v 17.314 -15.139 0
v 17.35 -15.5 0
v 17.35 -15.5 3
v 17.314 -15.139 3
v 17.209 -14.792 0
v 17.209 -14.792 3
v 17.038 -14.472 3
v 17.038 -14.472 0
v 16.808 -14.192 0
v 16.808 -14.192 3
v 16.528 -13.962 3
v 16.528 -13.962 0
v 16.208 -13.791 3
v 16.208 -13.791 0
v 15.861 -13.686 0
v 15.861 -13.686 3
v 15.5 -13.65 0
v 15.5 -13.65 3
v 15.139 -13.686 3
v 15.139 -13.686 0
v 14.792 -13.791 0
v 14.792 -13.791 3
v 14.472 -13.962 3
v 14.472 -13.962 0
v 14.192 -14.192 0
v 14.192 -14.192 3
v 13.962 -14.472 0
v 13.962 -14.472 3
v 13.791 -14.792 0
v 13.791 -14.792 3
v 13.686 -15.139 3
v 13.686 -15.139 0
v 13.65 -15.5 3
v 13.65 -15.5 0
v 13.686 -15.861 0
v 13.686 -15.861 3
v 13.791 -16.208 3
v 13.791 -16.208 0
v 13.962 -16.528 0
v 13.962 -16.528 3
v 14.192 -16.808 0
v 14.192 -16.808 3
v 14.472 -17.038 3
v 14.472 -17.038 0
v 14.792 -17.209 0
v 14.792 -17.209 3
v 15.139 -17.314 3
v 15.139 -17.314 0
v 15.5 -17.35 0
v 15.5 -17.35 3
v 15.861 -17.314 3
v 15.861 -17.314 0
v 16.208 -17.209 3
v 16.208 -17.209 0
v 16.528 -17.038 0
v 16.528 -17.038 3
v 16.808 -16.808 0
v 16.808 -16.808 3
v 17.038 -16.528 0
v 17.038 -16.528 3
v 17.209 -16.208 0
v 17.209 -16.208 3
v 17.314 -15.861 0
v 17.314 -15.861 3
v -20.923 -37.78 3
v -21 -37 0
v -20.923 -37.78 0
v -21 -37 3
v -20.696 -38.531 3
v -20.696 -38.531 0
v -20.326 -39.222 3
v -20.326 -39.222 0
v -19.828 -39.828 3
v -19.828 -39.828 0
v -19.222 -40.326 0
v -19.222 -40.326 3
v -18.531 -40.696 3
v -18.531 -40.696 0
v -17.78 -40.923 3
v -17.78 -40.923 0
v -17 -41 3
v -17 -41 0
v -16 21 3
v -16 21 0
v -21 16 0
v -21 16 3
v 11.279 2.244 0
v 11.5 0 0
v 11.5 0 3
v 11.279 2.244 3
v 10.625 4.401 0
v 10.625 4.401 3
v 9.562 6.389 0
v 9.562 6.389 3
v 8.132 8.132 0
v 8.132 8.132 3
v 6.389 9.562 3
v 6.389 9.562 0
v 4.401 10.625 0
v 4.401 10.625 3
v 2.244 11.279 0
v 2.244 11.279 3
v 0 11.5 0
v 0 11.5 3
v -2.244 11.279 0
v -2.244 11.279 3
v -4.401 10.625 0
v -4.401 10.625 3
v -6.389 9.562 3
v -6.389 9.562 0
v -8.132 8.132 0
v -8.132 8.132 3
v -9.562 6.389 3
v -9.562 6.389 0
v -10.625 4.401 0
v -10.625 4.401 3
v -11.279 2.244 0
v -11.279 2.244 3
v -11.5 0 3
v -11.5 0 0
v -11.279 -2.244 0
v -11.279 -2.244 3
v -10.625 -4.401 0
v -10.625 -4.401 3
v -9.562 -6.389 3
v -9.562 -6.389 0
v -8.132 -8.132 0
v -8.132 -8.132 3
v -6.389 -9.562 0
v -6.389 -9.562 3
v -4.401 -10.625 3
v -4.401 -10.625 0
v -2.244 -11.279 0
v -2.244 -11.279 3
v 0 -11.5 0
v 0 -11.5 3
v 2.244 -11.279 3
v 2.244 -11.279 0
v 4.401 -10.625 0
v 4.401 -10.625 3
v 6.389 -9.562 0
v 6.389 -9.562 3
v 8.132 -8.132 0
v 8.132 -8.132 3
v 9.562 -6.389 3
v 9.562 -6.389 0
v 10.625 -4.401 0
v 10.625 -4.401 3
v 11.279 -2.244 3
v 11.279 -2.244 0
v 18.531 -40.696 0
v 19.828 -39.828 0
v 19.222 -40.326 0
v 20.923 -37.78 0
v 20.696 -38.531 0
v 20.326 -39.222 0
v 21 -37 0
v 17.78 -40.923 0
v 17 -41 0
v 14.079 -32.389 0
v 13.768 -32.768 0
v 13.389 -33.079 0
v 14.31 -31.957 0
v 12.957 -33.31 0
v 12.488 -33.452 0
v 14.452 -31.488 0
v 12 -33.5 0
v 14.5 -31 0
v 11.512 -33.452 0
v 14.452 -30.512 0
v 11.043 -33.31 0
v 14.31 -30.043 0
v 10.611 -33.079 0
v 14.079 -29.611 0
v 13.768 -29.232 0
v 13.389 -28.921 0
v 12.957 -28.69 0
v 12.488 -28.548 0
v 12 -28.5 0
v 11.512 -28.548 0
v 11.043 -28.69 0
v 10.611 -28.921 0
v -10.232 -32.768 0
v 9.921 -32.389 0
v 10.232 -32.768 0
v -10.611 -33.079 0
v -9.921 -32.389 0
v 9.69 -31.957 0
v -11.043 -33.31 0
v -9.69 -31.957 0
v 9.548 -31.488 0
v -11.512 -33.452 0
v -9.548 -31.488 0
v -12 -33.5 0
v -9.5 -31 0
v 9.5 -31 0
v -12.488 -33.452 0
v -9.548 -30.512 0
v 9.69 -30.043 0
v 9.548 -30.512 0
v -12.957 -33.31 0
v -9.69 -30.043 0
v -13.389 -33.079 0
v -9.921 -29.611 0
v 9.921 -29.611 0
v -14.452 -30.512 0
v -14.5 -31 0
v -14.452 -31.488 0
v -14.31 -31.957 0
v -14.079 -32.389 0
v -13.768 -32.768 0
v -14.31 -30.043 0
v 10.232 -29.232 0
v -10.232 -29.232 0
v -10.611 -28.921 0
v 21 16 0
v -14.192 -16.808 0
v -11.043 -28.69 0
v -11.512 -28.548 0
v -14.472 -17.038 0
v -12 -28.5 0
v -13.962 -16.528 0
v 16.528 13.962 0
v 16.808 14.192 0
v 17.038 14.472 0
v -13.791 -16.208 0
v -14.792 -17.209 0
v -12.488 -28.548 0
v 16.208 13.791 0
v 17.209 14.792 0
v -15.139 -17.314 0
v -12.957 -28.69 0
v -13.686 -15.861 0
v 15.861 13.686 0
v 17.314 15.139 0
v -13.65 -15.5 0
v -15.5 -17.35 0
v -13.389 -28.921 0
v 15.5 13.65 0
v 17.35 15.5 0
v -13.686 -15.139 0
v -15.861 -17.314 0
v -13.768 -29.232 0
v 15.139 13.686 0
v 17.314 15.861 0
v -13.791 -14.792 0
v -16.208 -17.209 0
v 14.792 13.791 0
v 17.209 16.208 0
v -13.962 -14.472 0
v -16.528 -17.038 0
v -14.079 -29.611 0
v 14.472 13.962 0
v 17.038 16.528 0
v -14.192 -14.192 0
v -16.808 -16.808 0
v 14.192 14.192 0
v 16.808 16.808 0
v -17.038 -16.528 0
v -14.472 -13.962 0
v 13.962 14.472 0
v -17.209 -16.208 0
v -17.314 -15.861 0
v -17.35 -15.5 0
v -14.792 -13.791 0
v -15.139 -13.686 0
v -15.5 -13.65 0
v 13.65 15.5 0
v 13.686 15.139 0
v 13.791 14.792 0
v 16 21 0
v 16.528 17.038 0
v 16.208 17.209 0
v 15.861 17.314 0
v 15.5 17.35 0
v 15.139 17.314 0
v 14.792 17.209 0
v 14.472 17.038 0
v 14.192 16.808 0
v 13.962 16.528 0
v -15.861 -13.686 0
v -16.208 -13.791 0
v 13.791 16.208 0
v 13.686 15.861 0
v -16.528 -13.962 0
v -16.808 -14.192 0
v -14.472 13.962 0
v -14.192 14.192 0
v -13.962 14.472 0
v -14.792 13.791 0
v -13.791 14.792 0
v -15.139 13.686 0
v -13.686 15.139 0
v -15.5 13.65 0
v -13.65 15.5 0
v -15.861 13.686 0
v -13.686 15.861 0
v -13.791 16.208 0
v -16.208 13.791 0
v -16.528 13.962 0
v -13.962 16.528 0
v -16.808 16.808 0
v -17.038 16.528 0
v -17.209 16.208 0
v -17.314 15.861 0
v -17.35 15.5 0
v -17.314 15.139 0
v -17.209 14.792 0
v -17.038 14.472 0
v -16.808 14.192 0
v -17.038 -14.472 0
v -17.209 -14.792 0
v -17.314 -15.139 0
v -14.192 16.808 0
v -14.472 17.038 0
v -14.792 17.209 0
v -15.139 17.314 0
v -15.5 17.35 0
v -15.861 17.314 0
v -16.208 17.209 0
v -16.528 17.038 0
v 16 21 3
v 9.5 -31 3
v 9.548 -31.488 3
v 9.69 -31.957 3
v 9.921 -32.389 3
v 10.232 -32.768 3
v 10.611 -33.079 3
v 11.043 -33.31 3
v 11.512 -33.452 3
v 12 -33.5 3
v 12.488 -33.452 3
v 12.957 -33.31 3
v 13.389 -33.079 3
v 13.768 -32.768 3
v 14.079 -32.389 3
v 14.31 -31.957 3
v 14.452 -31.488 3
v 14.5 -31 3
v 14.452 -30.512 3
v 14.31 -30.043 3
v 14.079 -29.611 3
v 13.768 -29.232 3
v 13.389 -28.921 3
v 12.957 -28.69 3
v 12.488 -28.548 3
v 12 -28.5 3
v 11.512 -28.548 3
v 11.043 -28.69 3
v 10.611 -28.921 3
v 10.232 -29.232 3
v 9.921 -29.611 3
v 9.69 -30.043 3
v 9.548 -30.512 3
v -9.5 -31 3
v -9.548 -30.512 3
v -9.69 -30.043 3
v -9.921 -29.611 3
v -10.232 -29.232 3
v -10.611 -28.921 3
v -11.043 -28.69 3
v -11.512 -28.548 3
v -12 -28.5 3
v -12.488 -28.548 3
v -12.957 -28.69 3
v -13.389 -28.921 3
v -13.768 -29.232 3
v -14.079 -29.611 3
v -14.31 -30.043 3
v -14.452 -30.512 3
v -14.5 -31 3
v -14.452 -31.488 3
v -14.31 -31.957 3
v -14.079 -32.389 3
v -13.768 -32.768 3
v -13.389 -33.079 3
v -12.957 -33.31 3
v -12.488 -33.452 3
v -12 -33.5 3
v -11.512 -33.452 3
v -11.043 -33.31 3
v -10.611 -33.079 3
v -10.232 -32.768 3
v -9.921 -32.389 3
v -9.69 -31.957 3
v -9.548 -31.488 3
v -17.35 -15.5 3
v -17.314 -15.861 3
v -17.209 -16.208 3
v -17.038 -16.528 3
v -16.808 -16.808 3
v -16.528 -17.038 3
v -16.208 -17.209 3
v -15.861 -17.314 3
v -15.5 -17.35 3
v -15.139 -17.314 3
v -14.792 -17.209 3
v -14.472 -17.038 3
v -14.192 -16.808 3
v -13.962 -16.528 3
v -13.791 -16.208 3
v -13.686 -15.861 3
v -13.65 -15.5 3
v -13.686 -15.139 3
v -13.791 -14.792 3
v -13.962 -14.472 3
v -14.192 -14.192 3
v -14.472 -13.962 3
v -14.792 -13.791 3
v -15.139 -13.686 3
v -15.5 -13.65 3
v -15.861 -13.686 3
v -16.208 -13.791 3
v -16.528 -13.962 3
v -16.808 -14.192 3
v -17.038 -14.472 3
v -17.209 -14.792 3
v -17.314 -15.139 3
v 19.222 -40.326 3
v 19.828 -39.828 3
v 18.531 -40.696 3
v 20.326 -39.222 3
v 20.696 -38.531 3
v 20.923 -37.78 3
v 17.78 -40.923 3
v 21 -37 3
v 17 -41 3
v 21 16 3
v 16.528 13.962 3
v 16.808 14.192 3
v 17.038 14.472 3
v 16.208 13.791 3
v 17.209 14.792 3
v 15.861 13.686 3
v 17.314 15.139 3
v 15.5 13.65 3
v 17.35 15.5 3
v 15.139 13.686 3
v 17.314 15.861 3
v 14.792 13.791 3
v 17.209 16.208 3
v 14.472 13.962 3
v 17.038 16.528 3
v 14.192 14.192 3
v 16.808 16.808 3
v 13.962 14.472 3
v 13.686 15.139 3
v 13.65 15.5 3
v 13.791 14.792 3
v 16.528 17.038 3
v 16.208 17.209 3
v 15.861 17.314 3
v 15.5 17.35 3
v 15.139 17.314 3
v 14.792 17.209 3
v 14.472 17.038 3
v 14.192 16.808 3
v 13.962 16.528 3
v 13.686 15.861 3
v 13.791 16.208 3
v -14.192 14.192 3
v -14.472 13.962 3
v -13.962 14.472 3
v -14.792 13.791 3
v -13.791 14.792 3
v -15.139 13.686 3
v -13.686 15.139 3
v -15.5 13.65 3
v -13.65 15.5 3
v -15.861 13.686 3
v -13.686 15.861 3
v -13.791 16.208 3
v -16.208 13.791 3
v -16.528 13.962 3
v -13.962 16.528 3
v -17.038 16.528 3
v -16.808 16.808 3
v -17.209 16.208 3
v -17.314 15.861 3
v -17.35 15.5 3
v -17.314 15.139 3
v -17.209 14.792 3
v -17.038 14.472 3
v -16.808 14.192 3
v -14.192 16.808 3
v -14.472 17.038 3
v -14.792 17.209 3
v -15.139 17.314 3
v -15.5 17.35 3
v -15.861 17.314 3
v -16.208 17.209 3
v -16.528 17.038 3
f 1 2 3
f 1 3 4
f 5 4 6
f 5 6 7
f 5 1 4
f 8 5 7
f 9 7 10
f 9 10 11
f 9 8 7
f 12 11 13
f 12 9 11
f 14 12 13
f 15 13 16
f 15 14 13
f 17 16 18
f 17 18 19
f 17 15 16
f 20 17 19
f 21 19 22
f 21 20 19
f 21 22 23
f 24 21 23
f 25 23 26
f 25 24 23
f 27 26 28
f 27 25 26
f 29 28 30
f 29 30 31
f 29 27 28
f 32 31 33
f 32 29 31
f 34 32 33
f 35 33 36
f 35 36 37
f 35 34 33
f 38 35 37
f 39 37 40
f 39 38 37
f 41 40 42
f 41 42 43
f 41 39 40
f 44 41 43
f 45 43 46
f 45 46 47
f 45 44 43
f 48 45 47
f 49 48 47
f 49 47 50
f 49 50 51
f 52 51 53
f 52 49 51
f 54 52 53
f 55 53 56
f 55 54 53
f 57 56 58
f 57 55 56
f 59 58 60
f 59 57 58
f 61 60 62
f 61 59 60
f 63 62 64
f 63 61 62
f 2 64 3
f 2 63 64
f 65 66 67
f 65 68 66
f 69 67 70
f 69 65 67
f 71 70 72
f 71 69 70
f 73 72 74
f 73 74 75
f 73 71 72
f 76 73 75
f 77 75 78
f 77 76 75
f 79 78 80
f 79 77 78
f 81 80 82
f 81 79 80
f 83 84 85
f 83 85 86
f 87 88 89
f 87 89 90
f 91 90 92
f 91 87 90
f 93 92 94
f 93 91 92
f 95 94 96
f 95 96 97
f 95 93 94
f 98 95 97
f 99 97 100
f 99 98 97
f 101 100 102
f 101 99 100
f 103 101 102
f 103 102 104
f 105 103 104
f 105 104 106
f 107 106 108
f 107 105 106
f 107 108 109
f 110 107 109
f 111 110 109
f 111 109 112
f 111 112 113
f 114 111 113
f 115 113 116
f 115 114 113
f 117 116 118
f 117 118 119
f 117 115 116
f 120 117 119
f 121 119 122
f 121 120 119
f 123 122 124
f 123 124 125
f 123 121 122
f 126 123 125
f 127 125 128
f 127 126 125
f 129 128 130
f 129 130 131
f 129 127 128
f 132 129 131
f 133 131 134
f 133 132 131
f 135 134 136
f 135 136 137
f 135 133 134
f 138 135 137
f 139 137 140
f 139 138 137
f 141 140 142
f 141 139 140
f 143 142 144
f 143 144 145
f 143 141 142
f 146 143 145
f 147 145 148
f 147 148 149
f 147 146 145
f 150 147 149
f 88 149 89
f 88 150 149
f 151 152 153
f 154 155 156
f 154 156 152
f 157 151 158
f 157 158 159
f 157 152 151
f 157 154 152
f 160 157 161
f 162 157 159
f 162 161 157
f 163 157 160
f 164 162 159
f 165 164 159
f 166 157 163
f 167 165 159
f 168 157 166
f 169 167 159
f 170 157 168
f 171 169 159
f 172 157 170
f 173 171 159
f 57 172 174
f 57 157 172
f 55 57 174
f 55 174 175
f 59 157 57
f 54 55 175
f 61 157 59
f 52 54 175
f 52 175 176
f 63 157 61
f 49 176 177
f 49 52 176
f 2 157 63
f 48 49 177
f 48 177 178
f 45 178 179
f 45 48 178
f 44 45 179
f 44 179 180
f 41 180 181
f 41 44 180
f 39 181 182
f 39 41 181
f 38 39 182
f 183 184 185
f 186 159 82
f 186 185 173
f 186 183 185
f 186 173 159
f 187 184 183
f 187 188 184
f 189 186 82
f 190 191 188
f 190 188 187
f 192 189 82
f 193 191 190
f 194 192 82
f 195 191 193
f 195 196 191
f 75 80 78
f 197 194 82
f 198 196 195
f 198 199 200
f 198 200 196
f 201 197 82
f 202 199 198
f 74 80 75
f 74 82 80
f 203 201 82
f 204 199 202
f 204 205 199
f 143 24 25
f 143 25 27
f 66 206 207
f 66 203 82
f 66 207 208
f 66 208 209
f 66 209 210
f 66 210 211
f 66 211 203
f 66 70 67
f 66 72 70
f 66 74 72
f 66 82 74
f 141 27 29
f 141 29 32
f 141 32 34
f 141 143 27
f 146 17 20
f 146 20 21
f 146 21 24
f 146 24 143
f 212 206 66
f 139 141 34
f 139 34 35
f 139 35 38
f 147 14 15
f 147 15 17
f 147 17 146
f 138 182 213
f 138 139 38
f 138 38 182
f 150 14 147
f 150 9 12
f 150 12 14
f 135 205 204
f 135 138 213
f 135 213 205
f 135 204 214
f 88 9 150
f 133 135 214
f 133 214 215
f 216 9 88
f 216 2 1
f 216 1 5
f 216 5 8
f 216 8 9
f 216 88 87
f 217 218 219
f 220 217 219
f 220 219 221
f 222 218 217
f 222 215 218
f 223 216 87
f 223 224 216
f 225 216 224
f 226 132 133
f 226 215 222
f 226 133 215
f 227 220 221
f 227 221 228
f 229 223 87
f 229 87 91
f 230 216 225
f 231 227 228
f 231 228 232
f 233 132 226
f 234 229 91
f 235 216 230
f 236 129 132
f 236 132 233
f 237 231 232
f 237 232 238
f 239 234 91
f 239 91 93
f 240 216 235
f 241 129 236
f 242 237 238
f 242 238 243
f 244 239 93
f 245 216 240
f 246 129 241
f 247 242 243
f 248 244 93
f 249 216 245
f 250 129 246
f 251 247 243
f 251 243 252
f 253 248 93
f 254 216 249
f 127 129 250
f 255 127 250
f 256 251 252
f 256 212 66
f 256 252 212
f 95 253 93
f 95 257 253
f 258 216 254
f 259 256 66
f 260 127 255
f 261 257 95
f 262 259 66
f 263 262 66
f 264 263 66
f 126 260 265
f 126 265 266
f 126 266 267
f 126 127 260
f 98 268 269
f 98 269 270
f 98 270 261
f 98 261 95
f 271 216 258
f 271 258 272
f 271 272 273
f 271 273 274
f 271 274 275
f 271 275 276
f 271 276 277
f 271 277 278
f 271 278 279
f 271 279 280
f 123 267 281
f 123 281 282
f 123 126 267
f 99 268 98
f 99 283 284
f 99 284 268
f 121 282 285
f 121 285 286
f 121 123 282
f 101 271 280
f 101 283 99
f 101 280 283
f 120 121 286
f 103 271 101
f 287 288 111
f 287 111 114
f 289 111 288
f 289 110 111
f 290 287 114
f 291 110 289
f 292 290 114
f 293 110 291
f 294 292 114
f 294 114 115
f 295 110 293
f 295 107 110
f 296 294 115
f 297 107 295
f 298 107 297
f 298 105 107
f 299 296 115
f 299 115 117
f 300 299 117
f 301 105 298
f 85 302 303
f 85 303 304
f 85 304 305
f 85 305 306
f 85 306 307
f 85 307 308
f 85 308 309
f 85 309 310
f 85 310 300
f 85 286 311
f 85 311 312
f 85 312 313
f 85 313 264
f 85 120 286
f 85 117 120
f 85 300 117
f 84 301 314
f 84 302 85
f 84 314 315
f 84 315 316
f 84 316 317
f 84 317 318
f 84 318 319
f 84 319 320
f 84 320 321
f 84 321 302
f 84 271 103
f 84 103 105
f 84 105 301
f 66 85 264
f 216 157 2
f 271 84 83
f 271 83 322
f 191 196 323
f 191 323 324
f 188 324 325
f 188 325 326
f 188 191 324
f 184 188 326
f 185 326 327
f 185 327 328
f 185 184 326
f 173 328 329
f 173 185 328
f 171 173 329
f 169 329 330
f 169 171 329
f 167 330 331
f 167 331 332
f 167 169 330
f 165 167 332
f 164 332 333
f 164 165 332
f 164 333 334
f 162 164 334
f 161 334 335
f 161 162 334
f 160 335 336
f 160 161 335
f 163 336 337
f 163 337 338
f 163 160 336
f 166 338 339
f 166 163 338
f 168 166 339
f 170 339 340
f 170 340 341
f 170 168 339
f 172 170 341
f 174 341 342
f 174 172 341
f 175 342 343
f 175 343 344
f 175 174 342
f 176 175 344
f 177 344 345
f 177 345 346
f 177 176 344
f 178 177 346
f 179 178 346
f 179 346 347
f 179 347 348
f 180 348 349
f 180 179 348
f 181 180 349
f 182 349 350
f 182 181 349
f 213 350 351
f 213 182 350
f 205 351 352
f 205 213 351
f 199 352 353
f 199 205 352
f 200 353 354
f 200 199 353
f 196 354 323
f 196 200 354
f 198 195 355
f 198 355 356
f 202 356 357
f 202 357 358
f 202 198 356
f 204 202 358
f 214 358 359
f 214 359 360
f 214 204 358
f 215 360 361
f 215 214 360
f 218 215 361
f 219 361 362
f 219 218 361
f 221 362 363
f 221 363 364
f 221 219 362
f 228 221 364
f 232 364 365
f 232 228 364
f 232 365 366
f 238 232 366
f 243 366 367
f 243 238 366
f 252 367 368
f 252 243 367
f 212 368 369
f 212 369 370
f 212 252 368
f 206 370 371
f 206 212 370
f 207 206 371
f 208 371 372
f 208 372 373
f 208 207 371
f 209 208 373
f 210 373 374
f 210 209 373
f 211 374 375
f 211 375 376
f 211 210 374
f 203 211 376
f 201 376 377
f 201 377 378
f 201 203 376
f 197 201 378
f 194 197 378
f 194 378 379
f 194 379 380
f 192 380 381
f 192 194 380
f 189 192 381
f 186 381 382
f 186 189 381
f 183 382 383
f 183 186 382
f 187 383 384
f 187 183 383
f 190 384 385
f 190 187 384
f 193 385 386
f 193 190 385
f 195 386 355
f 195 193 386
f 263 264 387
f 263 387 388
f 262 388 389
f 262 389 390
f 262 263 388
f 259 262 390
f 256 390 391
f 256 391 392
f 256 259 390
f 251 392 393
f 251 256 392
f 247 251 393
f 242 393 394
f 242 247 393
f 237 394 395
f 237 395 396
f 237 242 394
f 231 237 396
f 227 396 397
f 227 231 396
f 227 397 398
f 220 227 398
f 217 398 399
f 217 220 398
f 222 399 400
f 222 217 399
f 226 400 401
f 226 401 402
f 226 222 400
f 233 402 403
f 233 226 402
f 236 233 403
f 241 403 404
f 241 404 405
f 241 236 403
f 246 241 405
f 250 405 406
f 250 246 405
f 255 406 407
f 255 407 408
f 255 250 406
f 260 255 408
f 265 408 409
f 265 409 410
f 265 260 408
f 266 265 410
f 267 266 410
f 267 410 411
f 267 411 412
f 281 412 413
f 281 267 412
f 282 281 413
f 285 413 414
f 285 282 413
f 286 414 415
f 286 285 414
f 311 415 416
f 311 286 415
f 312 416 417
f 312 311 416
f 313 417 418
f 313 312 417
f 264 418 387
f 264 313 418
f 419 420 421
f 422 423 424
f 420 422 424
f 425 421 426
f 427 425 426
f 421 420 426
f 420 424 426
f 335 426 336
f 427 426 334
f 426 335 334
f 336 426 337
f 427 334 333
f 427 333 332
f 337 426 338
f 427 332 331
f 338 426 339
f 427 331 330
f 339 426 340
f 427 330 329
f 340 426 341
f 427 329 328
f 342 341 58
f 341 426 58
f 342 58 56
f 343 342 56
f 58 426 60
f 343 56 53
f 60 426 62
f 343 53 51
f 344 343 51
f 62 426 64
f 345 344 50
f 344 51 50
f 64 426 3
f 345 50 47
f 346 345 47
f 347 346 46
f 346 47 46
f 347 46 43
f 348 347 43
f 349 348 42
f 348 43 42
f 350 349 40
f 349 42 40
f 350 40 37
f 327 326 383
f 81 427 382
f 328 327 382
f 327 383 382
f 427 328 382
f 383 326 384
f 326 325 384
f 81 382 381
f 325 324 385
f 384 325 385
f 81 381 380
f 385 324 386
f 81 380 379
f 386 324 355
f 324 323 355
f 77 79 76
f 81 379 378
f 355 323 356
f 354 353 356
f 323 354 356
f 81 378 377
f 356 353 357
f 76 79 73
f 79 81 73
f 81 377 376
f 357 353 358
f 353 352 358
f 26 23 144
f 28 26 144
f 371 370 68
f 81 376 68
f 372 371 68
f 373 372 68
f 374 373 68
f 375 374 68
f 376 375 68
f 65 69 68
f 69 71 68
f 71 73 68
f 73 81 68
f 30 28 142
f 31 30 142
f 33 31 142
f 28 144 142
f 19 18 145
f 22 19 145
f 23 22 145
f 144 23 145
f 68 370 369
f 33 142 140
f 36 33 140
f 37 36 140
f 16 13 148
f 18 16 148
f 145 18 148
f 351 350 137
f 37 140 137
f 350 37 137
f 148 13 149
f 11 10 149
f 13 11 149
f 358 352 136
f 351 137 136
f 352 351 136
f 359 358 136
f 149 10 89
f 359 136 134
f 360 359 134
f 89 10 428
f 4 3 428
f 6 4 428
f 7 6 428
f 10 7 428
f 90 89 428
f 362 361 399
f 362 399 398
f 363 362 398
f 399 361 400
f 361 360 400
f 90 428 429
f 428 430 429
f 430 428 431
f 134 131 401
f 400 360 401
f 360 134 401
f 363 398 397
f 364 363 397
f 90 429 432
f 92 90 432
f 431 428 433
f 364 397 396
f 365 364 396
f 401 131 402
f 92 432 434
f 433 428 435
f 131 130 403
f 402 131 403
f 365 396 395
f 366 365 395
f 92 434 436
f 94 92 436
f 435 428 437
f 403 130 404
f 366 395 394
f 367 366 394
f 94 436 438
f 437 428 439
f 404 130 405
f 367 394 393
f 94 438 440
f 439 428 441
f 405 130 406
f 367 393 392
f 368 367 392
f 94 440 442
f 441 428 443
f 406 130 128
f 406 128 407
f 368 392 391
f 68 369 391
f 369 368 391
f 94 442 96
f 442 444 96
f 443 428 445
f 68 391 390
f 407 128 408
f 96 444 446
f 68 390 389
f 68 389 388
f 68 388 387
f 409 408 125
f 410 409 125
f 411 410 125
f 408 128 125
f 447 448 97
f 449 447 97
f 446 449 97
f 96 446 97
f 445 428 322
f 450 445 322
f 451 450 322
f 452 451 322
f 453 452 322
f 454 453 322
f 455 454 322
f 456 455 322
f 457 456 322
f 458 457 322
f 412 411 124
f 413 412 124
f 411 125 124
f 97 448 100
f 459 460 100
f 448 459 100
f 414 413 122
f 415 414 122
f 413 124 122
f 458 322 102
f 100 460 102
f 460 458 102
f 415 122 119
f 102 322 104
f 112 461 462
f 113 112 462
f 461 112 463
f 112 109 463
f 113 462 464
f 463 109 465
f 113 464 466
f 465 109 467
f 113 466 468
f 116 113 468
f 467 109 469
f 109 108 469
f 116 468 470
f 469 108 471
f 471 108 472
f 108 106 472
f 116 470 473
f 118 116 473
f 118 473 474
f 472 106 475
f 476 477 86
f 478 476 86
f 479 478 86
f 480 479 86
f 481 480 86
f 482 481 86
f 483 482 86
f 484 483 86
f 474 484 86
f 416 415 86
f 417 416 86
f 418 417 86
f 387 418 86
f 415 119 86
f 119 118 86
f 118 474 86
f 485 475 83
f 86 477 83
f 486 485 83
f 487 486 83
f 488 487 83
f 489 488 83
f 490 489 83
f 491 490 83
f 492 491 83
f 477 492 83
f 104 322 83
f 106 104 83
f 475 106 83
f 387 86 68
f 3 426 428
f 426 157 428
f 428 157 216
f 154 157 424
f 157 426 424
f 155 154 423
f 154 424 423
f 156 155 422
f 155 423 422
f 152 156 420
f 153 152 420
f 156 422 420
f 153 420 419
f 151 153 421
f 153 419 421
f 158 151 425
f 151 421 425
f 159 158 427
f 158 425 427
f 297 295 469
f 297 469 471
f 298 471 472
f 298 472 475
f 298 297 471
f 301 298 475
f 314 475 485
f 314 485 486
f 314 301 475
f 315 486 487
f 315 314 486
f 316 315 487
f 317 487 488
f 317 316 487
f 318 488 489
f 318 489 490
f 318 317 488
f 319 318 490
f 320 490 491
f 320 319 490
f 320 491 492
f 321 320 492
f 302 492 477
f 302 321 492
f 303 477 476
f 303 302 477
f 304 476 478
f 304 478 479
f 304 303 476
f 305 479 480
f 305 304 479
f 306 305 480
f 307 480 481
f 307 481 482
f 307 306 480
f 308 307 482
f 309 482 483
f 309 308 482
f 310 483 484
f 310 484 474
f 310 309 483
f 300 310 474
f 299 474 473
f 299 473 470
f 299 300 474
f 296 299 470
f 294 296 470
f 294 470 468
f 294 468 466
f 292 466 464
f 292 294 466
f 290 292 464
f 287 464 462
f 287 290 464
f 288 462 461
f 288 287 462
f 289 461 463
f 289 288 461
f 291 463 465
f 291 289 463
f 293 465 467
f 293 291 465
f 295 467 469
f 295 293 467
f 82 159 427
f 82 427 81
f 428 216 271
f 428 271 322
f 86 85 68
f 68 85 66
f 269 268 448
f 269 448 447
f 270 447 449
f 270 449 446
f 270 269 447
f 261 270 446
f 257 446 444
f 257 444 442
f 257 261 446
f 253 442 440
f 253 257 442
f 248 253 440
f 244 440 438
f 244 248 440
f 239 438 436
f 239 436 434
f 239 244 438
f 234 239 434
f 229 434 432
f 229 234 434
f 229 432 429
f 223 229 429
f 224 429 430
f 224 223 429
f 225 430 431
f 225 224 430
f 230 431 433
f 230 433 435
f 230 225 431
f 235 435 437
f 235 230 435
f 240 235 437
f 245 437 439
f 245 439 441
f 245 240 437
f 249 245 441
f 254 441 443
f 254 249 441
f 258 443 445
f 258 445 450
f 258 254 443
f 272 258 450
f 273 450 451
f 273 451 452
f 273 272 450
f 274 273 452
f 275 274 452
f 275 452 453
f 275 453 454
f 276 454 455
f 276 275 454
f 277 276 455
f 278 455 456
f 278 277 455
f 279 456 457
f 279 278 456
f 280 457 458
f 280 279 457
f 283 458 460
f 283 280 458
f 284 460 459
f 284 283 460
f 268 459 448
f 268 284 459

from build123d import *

# Parameters (mm, degrees)
SKETCH_1_R      = 1.849740933
SKETCH_1_R_2    = 2.5
SKETCH_1_R_3    = 11.5
EXTRUDE_1_DEPTH = 3
FILLET_1_R      = 4
CHAMFER_1_SIZE  = 5


with BuildPart() as part:
    # 草圖1 → 填料-伸長1 (new body)
    with BuildSketch(Plane.XY):
        Polygon((-21, 21), (21, 21), (21, -21), (21, -41), (-21, -41), (-21, -21), align=None)
        with Locations((-15.5, 15.5)):
            Circle(SKETCH_1_R, mode=Mode.SUBTRACT)
        with Locations(Location((15.5, 15.5, 0), (0, 0, 180))):
            Circle(SKETCH_1_R, mode=Mode.SUBTRACT)
        with Locations((15.5, -15.5)):
            Circle(SKETCH_1_R, mode=Mode.SUBTRACT)
        with Locations(Location((-15.5, -15.5, 0), (0, 0, 180))):
            Circle(SKETCH_1_R, mode=Mode.SUBTRACT)
        with Locations((-12, -31)):
            Circle(SKETCH_1_R_2, mode=Mode.SUBTRACT)
        with Locations(Location((12, -31, 0), (0, 0, 180))):
            Circle(SKETCH_1_R_2, mode=Mode.SUBTRACT)
        Circle(SKETCH_1_R_3, mode=Mode.SUBTRACT)
    extrude(amount=EXTRUDE_1_DEPTH)

    # 圓角1
    fillet_1_edges = [part.edges().sort_by_distance(p)[0] for p in [
        (21, -41, 1.5),
        (-21, -41, 1.5),
    ]]
    fillet(fillet_1_edges, radius=FILLET_1_R)

    # 導角1
    chamfer_1_edges = [part.edges().sort_by_distance(p)[0] for p in [
        (-21, 21, 1.5),
        (21, 21, 1.5),
    ]]
    chamfer(chamfer_1_edges, length=CHAMFER_1_SIZE)


solid = part.part
